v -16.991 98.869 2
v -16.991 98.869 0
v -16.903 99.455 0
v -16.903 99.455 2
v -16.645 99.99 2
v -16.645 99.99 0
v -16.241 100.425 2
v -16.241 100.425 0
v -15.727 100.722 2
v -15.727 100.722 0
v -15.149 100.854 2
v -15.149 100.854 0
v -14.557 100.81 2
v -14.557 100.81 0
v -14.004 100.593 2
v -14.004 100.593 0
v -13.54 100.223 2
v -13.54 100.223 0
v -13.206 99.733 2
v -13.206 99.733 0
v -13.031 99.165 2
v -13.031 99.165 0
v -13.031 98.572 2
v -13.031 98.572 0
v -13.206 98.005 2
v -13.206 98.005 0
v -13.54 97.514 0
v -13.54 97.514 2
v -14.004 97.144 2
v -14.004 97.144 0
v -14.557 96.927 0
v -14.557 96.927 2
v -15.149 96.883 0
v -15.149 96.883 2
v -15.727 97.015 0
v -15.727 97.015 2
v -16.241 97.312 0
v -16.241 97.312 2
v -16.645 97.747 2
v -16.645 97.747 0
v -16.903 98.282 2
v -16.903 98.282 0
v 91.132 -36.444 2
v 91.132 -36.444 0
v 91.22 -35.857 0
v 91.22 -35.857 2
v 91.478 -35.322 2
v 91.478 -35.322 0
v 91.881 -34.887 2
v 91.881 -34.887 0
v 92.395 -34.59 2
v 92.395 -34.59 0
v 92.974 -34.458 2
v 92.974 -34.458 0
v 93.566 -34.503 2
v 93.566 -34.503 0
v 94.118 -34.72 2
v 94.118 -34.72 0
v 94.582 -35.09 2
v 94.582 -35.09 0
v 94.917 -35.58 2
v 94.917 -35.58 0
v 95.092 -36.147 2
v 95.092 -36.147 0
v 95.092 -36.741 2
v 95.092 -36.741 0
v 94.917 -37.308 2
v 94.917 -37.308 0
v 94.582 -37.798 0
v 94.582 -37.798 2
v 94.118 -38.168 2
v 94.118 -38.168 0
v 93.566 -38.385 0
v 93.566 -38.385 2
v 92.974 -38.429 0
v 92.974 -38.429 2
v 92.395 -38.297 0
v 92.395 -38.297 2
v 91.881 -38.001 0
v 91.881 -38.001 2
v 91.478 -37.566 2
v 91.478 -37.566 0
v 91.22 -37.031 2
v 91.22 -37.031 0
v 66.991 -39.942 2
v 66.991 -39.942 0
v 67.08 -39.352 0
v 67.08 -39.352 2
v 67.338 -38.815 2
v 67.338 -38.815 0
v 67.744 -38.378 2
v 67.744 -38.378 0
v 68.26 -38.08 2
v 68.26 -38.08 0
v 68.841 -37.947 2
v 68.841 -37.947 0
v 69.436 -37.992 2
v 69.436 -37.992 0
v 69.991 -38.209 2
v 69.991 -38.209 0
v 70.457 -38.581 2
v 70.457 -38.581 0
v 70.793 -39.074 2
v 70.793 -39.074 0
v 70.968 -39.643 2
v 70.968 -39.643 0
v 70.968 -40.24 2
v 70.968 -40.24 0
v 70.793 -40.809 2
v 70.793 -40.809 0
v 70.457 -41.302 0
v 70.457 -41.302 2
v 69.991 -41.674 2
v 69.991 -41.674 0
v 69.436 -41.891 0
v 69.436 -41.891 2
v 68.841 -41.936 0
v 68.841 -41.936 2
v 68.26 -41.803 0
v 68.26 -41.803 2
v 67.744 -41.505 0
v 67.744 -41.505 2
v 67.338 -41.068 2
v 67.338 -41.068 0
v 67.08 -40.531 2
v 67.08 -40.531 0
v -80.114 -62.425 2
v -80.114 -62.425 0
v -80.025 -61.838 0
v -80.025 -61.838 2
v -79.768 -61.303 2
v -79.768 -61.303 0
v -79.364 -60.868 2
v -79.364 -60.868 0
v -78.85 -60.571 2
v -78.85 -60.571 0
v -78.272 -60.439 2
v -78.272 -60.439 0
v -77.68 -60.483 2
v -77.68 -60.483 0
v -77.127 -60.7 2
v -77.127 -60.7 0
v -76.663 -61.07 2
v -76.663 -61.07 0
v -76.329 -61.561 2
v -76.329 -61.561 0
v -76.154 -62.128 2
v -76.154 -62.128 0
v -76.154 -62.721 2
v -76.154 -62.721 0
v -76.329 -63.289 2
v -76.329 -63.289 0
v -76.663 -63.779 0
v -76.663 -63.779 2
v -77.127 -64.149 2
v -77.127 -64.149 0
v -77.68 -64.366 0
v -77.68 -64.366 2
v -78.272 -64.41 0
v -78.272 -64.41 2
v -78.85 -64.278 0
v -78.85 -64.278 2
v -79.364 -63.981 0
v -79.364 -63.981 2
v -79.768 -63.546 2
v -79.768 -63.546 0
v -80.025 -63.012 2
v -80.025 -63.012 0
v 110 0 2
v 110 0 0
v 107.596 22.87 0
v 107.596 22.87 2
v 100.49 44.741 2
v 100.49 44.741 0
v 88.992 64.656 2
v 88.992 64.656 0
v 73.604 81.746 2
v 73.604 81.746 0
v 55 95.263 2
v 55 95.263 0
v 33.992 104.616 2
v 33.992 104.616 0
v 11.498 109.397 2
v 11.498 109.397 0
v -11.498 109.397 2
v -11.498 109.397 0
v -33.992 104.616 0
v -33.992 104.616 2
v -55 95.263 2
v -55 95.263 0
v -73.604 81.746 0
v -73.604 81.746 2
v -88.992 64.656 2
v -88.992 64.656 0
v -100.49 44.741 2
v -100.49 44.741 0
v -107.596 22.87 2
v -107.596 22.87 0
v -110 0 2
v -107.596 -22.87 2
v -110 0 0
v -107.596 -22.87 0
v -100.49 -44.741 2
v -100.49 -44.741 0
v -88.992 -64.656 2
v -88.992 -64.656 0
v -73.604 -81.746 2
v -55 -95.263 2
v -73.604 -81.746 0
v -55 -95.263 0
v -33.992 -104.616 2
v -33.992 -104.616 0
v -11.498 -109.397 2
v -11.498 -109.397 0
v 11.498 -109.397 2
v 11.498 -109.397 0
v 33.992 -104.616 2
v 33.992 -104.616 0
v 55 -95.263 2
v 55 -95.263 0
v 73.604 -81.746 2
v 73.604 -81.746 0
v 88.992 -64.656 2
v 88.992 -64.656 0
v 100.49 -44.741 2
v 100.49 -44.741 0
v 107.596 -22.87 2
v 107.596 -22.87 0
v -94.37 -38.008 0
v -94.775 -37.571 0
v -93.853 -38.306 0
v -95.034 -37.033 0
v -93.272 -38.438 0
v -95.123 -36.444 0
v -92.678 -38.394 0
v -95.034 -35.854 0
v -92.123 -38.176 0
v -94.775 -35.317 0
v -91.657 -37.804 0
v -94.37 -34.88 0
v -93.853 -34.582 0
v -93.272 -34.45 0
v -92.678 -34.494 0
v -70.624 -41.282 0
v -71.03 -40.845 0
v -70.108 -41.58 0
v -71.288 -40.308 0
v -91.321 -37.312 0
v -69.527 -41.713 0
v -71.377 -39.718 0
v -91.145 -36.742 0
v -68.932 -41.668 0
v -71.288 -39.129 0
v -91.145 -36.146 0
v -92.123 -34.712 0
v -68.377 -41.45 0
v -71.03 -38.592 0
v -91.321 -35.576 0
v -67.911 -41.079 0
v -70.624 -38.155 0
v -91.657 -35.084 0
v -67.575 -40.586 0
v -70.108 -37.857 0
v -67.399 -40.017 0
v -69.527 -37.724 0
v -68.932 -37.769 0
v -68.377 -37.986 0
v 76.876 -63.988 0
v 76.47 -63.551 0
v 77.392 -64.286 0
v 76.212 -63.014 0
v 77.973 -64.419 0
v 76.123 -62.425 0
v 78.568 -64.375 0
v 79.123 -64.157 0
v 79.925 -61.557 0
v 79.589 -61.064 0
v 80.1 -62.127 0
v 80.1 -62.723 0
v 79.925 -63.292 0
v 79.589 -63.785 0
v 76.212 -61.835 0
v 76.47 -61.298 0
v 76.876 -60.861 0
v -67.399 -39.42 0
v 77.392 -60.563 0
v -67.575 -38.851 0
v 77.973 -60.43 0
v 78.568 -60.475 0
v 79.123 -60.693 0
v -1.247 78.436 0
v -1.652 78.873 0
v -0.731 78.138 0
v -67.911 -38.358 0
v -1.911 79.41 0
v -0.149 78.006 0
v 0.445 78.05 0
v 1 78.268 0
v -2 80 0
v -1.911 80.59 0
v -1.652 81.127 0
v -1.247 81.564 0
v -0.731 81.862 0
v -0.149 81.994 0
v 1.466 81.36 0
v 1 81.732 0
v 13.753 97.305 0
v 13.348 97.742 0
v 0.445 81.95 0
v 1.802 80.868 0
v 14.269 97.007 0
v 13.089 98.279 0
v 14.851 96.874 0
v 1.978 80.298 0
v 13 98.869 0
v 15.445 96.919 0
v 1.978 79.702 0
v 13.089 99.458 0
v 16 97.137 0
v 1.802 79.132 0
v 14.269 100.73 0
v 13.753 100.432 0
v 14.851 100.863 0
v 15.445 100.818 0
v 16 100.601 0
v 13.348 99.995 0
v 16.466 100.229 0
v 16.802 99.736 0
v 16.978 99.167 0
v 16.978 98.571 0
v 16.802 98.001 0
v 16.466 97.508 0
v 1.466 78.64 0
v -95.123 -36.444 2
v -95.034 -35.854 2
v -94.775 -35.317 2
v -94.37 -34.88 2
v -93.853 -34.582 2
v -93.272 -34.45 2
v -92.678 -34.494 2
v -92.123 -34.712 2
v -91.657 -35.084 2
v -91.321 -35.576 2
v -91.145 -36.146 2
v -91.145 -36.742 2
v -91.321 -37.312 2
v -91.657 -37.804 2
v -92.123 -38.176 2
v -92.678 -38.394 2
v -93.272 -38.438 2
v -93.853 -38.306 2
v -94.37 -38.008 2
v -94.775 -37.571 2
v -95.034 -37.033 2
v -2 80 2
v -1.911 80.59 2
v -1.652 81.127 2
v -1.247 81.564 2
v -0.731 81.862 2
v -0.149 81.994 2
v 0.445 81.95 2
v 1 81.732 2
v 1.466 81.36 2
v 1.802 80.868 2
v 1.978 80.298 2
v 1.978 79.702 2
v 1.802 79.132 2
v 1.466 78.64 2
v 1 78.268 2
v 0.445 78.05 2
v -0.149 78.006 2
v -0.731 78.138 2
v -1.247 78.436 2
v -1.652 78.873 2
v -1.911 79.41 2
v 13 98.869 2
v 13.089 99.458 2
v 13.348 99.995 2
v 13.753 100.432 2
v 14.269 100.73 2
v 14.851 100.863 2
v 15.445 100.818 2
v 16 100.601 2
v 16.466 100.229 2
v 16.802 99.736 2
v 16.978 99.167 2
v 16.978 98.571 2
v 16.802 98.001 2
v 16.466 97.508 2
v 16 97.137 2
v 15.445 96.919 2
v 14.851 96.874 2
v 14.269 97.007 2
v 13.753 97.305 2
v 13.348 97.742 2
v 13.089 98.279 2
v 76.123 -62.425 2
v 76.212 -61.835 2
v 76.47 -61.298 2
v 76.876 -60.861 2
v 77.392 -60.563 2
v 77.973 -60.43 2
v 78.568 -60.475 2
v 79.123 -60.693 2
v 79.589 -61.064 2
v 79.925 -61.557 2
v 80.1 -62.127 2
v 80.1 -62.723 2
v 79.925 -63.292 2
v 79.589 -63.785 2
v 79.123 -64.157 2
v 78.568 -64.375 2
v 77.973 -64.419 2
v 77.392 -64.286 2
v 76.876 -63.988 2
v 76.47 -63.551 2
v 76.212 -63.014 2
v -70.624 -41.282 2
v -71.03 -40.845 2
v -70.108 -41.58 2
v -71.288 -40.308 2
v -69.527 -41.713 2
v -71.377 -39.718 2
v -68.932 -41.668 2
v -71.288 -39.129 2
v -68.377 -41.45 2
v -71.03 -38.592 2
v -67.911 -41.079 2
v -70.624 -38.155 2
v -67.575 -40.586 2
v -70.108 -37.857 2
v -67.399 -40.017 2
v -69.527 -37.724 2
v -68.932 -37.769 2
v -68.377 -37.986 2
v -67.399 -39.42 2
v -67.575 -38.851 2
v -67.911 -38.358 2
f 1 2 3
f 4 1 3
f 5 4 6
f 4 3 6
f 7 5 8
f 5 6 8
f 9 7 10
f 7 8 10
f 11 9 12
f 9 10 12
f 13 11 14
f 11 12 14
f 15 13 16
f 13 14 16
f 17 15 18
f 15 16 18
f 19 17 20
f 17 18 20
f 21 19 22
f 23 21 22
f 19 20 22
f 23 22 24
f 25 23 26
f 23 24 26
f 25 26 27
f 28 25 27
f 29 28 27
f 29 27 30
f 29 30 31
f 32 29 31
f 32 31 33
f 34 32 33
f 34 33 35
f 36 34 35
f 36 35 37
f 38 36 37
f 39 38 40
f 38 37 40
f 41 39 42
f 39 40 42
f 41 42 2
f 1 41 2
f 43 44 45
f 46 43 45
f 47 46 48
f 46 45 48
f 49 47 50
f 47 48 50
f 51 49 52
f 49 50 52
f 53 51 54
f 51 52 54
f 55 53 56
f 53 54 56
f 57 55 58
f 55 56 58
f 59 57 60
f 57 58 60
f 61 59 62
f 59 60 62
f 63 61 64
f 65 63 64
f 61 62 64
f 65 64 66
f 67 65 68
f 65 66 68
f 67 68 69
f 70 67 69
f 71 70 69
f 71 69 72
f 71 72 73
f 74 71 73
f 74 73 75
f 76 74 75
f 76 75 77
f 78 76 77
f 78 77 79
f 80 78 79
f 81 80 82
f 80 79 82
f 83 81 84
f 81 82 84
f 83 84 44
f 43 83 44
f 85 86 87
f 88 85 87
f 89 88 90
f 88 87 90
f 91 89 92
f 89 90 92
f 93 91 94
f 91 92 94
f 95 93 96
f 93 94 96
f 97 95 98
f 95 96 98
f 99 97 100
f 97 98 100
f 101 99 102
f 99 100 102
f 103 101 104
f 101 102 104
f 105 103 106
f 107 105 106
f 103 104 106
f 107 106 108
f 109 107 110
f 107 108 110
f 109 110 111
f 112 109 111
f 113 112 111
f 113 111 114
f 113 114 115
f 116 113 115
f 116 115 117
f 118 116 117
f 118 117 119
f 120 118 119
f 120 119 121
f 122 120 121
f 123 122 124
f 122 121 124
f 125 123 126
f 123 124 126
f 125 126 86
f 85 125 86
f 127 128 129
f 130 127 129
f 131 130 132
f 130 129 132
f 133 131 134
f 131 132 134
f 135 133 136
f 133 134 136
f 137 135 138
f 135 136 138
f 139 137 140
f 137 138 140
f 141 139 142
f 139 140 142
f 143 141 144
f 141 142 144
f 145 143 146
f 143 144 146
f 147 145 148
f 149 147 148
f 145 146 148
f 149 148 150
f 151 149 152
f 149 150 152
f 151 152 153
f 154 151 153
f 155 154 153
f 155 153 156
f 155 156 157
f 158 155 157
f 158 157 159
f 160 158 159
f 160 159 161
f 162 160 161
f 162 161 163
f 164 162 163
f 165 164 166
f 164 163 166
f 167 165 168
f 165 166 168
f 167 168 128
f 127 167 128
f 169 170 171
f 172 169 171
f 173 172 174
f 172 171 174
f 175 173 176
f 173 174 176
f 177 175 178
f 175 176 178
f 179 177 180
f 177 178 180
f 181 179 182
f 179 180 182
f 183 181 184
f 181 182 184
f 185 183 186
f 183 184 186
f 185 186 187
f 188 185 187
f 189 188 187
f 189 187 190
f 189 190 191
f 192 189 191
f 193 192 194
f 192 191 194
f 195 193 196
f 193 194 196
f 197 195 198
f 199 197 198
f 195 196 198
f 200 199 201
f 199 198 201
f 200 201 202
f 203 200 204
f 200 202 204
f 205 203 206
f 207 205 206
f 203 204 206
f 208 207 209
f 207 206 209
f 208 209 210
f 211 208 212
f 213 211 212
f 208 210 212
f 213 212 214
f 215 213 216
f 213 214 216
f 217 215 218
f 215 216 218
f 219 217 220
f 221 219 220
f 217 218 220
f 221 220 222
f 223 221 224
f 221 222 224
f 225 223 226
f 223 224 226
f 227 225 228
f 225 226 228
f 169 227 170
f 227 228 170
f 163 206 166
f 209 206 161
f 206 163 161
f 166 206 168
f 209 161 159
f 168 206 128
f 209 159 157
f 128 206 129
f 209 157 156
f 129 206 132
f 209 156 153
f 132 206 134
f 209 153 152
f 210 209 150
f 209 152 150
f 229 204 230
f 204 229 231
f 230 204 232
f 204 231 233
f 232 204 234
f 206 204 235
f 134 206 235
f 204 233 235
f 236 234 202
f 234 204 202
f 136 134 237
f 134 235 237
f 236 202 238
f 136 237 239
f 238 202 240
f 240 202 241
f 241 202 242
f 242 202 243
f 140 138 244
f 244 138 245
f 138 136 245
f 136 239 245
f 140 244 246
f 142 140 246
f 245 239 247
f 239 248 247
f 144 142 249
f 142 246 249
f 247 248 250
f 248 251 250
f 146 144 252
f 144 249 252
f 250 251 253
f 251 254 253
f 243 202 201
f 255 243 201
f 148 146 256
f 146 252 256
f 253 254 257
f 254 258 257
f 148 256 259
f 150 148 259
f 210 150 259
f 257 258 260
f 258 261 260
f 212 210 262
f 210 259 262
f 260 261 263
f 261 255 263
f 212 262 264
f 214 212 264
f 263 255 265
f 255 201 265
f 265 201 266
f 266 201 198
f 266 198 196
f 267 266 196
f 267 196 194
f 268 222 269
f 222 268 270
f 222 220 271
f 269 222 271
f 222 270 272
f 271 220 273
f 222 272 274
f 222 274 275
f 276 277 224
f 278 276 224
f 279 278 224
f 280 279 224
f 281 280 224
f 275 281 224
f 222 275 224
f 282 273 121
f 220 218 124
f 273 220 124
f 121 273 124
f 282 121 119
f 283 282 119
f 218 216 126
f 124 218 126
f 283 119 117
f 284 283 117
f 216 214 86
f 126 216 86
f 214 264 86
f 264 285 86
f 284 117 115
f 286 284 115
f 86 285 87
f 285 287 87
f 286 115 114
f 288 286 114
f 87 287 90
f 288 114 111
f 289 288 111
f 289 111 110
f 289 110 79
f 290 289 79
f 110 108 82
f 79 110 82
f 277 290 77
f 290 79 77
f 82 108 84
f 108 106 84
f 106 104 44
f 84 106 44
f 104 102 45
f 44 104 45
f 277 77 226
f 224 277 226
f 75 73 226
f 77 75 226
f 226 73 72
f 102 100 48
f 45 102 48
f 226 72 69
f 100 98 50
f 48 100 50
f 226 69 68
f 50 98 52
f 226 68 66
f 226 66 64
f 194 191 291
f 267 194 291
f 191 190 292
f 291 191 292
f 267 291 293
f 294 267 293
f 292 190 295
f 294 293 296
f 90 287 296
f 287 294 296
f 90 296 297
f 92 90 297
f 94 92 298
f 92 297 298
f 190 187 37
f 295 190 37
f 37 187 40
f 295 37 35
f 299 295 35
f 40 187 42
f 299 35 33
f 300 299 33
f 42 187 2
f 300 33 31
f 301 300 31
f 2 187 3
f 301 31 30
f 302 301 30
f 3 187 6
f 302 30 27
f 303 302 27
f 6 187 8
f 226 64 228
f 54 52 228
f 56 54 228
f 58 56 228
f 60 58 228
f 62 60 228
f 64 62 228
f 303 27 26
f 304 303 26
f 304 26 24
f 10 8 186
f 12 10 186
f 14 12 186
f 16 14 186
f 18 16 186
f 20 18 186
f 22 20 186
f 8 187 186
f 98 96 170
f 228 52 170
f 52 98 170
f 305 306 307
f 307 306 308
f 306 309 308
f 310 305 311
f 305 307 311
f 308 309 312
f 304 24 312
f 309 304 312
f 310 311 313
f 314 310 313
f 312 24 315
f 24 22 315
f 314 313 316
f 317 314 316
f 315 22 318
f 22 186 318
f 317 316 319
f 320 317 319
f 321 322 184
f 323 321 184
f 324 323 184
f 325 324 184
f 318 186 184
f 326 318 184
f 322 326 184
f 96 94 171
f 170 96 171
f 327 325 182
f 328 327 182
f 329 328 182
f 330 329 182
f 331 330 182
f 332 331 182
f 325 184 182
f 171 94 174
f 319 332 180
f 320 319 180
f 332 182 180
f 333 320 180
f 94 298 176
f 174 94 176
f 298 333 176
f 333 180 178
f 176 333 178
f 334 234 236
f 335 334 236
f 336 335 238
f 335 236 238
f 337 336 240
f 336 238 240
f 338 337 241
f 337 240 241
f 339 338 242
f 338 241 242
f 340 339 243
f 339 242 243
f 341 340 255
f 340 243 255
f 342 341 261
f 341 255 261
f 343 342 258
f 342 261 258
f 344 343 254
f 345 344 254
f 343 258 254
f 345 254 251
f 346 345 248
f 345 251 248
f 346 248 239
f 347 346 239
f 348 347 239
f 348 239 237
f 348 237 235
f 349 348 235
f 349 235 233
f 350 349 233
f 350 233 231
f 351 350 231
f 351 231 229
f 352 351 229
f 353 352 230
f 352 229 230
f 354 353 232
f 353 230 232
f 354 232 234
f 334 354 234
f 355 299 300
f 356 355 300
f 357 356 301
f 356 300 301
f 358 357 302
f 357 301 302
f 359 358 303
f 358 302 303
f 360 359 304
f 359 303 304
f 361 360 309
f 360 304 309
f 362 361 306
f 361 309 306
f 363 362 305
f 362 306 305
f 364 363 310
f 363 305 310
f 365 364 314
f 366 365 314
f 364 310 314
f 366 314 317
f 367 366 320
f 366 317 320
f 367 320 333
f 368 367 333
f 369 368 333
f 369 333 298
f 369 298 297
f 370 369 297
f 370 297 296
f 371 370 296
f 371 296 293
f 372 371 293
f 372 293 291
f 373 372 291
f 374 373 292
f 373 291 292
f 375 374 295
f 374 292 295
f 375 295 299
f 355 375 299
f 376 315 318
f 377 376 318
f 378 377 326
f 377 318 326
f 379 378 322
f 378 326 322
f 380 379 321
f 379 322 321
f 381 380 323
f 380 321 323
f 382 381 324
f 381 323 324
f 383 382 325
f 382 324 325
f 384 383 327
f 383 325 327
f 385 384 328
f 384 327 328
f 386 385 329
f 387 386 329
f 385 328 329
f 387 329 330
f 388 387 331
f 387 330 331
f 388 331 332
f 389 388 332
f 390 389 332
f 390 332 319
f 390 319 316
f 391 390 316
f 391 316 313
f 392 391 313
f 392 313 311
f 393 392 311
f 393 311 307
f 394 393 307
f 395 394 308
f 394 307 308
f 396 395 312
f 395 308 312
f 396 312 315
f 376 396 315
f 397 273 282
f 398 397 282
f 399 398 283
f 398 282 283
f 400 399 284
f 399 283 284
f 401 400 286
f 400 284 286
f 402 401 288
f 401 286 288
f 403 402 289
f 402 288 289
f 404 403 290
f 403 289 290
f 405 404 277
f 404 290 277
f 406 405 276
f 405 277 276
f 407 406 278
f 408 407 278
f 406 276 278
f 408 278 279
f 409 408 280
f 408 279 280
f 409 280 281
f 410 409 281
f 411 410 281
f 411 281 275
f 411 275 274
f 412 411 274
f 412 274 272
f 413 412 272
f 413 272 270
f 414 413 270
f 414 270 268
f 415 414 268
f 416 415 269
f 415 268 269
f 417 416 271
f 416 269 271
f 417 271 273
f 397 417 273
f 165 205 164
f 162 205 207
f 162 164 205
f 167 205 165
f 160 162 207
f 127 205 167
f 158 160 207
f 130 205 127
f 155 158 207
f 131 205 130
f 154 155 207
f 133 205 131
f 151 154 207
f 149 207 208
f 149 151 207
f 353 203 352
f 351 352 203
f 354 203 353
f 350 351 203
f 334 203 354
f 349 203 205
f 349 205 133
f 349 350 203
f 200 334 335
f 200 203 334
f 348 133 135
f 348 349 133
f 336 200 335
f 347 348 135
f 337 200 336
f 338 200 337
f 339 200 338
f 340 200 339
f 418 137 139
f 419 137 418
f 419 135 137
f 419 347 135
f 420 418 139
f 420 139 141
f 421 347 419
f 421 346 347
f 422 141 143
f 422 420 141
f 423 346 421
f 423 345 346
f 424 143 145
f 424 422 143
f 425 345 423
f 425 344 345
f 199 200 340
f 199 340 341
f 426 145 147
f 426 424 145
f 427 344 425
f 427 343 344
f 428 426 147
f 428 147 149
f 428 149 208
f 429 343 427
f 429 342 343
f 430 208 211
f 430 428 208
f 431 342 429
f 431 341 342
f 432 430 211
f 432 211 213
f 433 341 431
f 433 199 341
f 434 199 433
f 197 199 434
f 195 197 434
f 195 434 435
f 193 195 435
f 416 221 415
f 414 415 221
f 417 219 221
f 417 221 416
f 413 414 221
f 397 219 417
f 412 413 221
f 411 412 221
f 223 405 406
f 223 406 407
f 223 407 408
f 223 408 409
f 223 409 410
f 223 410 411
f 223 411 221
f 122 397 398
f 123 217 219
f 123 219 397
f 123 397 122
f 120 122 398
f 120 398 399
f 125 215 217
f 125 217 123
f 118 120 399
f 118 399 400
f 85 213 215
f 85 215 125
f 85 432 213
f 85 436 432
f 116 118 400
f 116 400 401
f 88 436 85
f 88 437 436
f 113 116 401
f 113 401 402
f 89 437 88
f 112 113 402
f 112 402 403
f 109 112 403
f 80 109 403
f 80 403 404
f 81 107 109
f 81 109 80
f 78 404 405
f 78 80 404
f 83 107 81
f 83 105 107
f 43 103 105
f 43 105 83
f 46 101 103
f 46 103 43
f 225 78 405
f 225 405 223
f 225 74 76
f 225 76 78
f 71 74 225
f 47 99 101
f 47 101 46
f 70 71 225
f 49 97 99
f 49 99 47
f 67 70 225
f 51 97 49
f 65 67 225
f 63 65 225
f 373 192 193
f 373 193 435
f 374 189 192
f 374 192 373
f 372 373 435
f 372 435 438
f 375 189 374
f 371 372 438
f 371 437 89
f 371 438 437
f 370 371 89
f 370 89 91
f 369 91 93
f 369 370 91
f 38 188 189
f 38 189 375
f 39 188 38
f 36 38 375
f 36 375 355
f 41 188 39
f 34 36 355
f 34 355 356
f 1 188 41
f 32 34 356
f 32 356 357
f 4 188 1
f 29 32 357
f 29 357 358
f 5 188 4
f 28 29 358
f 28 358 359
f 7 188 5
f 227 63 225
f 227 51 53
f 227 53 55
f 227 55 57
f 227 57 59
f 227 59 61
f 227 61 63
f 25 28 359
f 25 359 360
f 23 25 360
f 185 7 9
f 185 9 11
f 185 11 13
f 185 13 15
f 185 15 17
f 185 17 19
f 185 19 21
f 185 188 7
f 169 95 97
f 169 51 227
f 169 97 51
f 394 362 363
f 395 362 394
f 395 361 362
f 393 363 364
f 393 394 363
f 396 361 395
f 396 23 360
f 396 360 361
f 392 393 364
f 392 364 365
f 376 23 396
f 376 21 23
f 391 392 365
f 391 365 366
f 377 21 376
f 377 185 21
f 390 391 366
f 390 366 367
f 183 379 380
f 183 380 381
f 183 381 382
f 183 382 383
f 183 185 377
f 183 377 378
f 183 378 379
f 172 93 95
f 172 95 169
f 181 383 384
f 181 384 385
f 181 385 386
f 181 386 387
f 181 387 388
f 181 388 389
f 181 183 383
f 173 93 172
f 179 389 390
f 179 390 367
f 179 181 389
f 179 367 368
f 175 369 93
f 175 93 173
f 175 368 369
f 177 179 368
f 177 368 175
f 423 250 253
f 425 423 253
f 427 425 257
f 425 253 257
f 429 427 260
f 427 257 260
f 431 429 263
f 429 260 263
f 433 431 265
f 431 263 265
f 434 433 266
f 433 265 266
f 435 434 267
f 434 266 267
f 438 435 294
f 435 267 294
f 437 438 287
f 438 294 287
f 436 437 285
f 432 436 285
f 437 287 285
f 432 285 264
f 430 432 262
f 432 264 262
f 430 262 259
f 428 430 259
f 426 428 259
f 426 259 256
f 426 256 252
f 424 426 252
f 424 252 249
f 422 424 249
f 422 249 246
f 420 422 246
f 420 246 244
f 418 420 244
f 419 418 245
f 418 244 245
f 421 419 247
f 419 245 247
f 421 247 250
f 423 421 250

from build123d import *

# Parameters (mm, degrees)
ESQUISSE2_R             = 110
BOSS_EXTRU_1_DEPTH      = 2
ESQUISSE7_R             = 2
ESQUISSE7_R_2           = 1.991144914
ENL_V_MAT_EXTRU_7_DEPTH = 2


with BuildPart() as part:
    # Esquisse2 → Boss.-Extru.1 (new body)
    with BuildSketch(Plane.XY):
        Circle(ESQUISSE2_R)
    extrude(amount=BOSS_EXTRU_1_DEPTH)

    # Esquisse7 → Enlèv. mat.-Extru.7 (cut)
    with BuildSketch(Plane(origin=(0, 0, 0), x_dir=(-1, 0, 0), z_dir=(0, 0, -1))):
        with Locations((-15, 98.868599666)):
            Circle(ESQUISSE7_R)
        with Locations((15, 98.868599666)):
            Circle(ESQUISSE7_R_2)
        with Locations((69.377054927, -39.718437198)):
            Circle(ESQUISSE7_R)
        with Locations((93.122718948, -36.443918776)):
            Circle(ESQUISSE7_R)
        with Locations((78.122718948, -62.42468089)):
            Circle(ESQUISSE7_R_2)
        with Locations((-68.990680451, -39.941510605)):
            Circle(ESQUISSE7_R)
        with Locations((-78.122718948, -62.42468089)):
            Circle(ESQUISSE7_R)
        with Locations((-93.122718948, -36.443918776)):
            Circle(ESQUISSE7_R_2)
        with Locations((0, 80)):
            Circle(ESQUISSE7_R)
    extrude(amount=-ENL_V_MAT_EXTRU_7_DEPTH, mode=Mode.SUBTRACT)


solid = part.part
